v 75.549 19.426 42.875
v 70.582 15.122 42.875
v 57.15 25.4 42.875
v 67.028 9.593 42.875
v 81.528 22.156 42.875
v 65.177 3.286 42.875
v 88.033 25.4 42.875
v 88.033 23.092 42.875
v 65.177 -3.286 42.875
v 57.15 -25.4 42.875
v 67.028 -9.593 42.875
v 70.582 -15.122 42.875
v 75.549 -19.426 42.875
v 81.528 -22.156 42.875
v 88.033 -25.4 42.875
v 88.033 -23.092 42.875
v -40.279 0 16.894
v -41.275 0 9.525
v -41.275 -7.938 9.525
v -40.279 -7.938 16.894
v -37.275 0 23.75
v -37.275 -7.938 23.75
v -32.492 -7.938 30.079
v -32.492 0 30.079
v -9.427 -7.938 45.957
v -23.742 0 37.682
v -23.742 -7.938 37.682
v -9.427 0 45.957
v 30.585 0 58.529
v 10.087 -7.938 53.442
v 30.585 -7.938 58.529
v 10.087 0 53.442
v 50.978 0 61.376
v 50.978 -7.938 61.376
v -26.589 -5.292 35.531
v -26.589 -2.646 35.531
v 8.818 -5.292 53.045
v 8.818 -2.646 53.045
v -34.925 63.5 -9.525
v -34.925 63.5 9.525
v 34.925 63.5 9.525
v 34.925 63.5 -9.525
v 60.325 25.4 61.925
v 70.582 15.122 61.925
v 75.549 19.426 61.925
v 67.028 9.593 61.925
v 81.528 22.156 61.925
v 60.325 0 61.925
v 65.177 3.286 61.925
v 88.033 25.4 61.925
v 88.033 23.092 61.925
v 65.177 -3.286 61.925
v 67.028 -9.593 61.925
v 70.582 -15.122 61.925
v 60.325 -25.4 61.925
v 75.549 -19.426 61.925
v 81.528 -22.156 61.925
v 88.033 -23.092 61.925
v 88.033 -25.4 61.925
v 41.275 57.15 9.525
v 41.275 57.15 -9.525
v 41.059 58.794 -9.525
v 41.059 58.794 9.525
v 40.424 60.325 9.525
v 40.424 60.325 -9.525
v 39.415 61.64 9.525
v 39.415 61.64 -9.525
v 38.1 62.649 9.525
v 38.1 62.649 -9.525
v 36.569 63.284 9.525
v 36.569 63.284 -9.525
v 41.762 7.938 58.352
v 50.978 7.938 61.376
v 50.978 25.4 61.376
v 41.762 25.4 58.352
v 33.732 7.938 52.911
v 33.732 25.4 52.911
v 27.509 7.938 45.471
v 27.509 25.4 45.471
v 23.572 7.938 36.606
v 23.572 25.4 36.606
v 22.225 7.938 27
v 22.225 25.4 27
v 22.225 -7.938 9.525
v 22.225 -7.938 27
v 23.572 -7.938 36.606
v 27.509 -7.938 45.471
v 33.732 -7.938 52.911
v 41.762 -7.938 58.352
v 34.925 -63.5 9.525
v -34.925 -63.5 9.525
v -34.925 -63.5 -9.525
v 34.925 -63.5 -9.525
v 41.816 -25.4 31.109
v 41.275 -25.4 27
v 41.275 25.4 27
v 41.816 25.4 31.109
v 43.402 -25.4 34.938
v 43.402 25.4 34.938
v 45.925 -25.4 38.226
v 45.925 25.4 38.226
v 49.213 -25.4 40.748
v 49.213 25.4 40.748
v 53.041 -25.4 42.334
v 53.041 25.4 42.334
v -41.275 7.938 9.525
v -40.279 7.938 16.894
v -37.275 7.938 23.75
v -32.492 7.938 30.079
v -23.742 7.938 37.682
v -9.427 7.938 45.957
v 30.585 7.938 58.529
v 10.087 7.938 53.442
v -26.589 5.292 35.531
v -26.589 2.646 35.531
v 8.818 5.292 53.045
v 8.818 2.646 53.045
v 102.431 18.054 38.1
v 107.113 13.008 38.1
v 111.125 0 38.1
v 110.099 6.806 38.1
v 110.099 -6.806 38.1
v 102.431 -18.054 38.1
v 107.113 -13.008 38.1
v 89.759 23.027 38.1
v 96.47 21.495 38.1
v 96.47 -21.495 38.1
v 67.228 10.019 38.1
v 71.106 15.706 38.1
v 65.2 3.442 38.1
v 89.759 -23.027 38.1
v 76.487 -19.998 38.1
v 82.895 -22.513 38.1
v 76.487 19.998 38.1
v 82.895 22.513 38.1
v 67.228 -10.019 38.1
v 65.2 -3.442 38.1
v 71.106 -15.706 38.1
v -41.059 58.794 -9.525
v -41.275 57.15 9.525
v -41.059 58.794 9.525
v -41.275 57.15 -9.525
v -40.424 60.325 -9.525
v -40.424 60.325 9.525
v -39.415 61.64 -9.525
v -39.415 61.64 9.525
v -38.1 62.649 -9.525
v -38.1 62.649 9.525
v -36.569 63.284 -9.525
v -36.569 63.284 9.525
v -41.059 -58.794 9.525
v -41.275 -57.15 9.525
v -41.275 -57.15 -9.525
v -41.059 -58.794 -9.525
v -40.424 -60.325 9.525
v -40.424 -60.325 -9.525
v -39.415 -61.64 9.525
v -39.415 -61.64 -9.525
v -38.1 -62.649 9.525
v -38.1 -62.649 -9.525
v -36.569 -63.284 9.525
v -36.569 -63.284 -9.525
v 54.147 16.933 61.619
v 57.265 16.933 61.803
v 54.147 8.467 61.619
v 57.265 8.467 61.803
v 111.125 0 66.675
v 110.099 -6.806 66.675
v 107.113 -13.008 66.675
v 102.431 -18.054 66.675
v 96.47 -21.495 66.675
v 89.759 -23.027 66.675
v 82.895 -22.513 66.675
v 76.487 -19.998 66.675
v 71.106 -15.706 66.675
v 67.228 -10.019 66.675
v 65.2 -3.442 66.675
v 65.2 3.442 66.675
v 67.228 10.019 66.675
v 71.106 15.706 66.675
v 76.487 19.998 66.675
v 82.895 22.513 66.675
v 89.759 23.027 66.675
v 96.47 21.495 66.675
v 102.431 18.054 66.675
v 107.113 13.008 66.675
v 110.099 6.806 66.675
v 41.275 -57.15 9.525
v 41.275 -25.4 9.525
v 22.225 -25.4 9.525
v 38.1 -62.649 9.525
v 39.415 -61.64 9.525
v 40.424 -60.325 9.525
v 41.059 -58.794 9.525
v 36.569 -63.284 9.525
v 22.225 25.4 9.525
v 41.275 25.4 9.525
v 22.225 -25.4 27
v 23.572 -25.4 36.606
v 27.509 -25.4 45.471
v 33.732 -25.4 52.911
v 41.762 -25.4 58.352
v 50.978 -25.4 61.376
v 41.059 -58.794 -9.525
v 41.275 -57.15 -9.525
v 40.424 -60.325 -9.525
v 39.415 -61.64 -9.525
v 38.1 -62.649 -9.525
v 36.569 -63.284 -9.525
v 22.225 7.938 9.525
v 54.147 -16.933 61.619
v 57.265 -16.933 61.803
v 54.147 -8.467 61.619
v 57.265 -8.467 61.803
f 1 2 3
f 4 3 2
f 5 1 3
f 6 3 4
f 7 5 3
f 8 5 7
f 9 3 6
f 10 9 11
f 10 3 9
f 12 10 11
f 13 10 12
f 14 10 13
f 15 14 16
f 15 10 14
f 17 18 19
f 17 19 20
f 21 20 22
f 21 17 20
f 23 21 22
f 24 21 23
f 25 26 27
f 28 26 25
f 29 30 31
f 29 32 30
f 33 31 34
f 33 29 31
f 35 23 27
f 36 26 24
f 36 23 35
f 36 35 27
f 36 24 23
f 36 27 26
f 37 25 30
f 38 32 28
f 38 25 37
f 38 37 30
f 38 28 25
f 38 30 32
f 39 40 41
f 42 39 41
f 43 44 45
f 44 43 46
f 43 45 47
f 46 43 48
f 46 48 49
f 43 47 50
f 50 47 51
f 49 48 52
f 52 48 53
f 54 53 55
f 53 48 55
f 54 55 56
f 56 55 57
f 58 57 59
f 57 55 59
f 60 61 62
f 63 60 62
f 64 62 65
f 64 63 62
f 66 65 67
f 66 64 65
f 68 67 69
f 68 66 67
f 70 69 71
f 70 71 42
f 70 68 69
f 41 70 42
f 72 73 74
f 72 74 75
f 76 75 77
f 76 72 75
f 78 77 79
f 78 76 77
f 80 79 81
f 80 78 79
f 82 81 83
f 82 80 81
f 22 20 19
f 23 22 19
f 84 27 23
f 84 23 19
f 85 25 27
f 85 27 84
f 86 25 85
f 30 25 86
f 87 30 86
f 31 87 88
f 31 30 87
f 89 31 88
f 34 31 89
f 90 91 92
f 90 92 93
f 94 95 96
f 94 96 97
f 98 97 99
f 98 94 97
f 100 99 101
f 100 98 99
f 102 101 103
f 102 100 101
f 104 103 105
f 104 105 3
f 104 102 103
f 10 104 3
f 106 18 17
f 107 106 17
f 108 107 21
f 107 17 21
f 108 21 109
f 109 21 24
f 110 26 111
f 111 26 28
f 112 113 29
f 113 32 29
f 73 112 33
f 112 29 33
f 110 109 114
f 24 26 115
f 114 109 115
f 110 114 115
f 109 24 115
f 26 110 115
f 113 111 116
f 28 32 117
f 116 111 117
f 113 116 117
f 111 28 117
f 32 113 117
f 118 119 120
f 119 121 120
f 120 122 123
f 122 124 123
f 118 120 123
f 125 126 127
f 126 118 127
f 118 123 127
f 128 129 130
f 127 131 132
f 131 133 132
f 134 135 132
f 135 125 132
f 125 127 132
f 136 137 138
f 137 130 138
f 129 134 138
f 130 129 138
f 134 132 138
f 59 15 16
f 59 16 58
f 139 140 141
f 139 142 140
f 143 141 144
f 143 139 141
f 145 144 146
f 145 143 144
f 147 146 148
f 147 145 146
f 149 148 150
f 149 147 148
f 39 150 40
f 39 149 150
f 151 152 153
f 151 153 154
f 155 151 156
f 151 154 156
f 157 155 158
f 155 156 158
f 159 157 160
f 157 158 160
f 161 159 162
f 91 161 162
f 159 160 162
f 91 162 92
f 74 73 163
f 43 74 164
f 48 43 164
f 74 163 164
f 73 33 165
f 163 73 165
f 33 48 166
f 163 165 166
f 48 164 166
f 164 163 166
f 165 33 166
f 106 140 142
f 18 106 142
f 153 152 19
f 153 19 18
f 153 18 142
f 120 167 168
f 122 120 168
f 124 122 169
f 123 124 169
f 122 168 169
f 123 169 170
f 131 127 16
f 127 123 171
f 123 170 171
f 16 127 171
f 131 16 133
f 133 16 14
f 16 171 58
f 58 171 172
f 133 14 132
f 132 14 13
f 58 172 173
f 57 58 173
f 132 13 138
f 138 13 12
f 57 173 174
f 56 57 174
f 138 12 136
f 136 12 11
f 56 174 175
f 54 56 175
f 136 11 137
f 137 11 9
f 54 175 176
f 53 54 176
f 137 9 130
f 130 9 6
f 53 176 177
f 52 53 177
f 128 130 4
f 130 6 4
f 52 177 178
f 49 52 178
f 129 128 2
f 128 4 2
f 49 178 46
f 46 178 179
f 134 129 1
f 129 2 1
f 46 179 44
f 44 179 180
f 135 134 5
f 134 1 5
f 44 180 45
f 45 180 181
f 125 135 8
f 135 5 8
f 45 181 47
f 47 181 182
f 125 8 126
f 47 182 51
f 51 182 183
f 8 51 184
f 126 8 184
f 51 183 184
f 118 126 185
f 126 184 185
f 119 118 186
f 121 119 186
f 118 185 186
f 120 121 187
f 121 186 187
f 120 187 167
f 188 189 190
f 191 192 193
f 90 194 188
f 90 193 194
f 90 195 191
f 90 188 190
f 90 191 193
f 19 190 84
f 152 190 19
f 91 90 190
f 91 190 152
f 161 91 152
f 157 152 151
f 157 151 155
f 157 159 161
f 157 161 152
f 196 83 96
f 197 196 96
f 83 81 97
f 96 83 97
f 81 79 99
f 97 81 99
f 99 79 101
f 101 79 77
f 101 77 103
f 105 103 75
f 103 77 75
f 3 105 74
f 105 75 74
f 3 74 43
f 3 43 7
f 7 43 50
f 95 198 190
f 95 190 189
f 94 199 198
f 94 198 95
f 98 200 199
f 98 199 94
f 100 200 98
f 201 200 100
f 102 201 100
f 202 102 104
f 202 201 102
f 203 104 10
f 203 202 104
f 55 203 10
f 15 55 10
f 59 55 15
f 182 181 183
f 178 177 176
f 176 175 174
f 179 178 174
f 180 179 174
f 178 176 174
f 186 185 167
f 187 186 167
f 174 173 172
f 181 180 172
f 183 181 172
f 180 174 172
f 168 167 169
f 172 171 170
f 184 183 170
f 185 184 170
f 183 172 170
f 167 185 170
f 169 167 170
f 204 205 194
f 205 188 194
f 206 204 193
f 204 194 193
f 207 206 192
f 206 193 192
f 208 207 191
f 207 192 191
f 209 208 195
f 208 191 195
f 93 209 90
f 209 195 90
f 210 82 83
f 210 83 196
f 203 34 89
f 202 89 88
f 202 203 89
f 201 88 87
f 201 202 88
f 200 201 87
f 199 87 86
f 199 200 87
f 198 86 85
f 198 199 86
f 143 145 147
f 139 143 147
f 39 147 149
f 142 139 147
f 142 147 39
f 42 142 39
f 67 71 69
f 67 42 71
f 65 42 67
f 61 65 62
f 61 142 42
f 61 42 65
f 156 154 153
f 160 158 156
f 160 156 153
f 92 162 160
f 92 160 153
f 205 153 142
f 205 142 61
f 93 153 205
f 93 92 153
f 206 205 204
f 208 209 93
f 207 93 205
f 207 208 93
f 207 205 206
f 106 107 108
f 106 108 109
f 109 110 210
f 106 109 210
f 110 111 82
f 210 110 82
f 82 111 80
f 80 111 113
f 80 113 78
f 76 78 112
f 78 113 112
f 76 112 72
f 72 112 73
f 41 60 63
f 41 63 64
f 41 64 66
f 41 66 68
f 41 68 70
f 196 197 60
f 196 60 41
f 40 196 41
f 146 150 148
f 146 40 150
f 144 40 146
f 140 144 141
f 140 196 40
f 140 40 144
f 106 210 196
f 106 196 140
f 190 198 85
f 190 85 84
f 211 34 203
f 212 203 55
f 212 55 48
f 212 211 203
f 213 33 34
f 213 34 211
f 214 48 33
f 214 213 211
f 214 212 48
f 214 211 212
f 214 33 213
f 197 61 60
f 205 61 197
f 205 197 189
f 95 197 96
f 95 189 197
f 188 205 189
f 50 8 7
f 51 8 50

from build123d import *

# Parameters (mm, degrees)
F1_DEPTH = 63.5
F2_DEPTH = 25.4
F3_DEPTH = 7.9375
F0_W     = 27.708321
F0_H     = 19.05
F4_DEPTH = 25.4
F6_R     = 6.35


with BuildPart() as f1:
    # F0 (on Front) → F1 (new body, symmetric)
    with BuildSketch(Plane.XZ):
        Polygon((41.275, -9.525), (41.275, 9.525), (22.225, 9.525), (-41.275, 9.525), (-41.275, -9.525), align=None)
    extrude(amount=F1_DEPTH, both=True)

    # F0 (on Front) → F2 (join, symmetric)
    with BuildSketch(Plane.XZ):
        with BuildLine():
            Line((22.225, 9.525), (41.275, 9.525))
            Line((41.275, 9.525), (41.275, 27.0002))
            ThreePointArc((41.275, 27.0002), (45.92468, 38.22552), (57.15, 42.8752))
            Line((57.15, 42.8752), (60.325, 42.8752))
            Line((60.325, 42.8752), (60.325, 61.9252))
            add(Edge.make_bspline(
                [(50.978388, 61.375581), (54.16985, 61.649544), (57.295356, 61.833243), (60.325, 61.9252)],
                knots=[106.038732, 106.038732, 106.038732, 106.038732, 114.316845, 114.316845, 114.316845, 114.316845], degree=3))
            ThreePointArc((50.978388, 61.375581), (30.361017, 49.407923), (22.225, 27.0002))
            Line((22.225, 27.0002), (22.225, 9.525))
        make_face()
    extrude(amount=F2_DEPTH, both=True)

    # F0 (on Front) → F3 (join, symmetric)
    with BuildSketch(Plane.XZ):
        with BuildLine():
            Line((-41.275, 9.525), (22.225, 9.525))
            Line((22.225, 9.525), (22.225, 27.0002))
            ThreePointArc((22.225, 27.0002), (30.361017, 49.407923), (50.978388, 61.375581))
            add(Edge.make_bspline(
                [(-41.275, 9.525), (-41.606238, 39.546193), (10.097253, 57.86625), (50.978388, 61.375581)],
                knots=[0, 0, 0, 0, 106.038732, 106.038732, 106.038732, 106.038732], degree=3))
        make_face()
    extrude(amount=F3_DEPTH, both=True)

    # F0 (on Front) → F4 (join, symmetric)
    with BuildSketch(Plane.XZ):
        with Locations((74.17916, 52.4002)):
            Rectangle(F0_W, F0_H)
    extrude(amount=F4_DEPTH, both=True)

    # F0 (on Front) → F5 (revolve)
    with BuildSketch(Plane.XZ):
        Polygon((88.033321, 61.9252), (88.033321, 42.8752), (88.033321, 38.1), (111.125, 38.1), (111.125, 66.675), (88.033321, 66.675), align=None)
    revolve(axis=Axis((88.033321, 0, 52.3875), (0, 0, -1)))

    # F6
    f6_edges = [f1.edges().sort_by_distance(p)[0] for p in [
        (41.275, -63.5, 0),
        (-41.275, -63.5, 0),
        (-41.275, 63.5, 0),
        (41.275, 63.5, 0),
    ]]
    fillet(f6_edges, radius=F6_R)


solid = f1.part
